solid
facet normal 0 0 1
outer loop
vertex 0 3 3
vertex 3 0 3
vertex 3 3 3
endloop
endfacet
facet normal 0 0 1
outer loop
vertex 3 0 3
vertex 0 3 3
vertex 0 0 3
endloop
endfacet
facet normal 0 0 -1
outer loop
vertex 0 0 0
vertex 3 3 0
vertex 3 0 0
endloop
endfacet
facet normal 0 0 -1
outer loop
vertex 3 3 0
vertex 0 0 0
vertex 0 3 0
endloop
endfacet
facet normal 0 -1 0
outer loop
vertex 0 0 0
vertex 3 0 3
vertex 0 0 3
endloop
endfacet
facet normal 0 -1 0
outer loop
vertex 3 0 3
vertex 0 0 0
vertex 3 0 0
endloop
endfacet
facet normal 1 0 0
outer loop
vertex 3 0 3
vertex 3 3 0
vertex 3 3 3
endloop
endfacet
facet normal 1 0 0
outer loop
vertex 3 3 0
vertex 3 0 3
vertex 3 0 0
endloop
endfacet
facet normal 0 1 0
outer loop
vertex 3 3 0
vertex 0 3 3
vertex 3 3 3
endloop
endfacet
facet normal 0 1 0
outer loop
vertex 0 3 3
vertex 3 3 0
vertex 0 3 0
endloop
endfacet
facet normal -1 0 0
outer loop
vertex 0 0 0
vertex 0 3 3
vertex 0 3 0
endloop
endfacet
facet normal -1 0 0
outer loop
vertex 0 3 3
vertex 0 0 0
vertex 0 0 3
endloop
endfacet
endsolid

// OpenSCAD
if (true) cube(3); else { cube(5); echo(10); }

/*
//use <xxx.scad>;

x = 19 + 32 * 15 / 20;

echo(123);

% ! echo(19 + 32 * 15, 20);

if (true) cube(3); else { cube(5); echo(10); }

/*
function f(a, b = 2) = a + b;
f = function (a, b = 2) a + 2 * b;

echo(f(1, 1));
echo(f(5, b = 4));
echo(f(b = 2, 4));

x = 10;
{
    x = 12;
}
echo(x);

union() {
    cube([20, 20, 1], center = false);
    sphere(r = 5);
}

xx = [ 1 : 5 ];
echo(xx);

echo([1 : 1 : 10]);
*/
